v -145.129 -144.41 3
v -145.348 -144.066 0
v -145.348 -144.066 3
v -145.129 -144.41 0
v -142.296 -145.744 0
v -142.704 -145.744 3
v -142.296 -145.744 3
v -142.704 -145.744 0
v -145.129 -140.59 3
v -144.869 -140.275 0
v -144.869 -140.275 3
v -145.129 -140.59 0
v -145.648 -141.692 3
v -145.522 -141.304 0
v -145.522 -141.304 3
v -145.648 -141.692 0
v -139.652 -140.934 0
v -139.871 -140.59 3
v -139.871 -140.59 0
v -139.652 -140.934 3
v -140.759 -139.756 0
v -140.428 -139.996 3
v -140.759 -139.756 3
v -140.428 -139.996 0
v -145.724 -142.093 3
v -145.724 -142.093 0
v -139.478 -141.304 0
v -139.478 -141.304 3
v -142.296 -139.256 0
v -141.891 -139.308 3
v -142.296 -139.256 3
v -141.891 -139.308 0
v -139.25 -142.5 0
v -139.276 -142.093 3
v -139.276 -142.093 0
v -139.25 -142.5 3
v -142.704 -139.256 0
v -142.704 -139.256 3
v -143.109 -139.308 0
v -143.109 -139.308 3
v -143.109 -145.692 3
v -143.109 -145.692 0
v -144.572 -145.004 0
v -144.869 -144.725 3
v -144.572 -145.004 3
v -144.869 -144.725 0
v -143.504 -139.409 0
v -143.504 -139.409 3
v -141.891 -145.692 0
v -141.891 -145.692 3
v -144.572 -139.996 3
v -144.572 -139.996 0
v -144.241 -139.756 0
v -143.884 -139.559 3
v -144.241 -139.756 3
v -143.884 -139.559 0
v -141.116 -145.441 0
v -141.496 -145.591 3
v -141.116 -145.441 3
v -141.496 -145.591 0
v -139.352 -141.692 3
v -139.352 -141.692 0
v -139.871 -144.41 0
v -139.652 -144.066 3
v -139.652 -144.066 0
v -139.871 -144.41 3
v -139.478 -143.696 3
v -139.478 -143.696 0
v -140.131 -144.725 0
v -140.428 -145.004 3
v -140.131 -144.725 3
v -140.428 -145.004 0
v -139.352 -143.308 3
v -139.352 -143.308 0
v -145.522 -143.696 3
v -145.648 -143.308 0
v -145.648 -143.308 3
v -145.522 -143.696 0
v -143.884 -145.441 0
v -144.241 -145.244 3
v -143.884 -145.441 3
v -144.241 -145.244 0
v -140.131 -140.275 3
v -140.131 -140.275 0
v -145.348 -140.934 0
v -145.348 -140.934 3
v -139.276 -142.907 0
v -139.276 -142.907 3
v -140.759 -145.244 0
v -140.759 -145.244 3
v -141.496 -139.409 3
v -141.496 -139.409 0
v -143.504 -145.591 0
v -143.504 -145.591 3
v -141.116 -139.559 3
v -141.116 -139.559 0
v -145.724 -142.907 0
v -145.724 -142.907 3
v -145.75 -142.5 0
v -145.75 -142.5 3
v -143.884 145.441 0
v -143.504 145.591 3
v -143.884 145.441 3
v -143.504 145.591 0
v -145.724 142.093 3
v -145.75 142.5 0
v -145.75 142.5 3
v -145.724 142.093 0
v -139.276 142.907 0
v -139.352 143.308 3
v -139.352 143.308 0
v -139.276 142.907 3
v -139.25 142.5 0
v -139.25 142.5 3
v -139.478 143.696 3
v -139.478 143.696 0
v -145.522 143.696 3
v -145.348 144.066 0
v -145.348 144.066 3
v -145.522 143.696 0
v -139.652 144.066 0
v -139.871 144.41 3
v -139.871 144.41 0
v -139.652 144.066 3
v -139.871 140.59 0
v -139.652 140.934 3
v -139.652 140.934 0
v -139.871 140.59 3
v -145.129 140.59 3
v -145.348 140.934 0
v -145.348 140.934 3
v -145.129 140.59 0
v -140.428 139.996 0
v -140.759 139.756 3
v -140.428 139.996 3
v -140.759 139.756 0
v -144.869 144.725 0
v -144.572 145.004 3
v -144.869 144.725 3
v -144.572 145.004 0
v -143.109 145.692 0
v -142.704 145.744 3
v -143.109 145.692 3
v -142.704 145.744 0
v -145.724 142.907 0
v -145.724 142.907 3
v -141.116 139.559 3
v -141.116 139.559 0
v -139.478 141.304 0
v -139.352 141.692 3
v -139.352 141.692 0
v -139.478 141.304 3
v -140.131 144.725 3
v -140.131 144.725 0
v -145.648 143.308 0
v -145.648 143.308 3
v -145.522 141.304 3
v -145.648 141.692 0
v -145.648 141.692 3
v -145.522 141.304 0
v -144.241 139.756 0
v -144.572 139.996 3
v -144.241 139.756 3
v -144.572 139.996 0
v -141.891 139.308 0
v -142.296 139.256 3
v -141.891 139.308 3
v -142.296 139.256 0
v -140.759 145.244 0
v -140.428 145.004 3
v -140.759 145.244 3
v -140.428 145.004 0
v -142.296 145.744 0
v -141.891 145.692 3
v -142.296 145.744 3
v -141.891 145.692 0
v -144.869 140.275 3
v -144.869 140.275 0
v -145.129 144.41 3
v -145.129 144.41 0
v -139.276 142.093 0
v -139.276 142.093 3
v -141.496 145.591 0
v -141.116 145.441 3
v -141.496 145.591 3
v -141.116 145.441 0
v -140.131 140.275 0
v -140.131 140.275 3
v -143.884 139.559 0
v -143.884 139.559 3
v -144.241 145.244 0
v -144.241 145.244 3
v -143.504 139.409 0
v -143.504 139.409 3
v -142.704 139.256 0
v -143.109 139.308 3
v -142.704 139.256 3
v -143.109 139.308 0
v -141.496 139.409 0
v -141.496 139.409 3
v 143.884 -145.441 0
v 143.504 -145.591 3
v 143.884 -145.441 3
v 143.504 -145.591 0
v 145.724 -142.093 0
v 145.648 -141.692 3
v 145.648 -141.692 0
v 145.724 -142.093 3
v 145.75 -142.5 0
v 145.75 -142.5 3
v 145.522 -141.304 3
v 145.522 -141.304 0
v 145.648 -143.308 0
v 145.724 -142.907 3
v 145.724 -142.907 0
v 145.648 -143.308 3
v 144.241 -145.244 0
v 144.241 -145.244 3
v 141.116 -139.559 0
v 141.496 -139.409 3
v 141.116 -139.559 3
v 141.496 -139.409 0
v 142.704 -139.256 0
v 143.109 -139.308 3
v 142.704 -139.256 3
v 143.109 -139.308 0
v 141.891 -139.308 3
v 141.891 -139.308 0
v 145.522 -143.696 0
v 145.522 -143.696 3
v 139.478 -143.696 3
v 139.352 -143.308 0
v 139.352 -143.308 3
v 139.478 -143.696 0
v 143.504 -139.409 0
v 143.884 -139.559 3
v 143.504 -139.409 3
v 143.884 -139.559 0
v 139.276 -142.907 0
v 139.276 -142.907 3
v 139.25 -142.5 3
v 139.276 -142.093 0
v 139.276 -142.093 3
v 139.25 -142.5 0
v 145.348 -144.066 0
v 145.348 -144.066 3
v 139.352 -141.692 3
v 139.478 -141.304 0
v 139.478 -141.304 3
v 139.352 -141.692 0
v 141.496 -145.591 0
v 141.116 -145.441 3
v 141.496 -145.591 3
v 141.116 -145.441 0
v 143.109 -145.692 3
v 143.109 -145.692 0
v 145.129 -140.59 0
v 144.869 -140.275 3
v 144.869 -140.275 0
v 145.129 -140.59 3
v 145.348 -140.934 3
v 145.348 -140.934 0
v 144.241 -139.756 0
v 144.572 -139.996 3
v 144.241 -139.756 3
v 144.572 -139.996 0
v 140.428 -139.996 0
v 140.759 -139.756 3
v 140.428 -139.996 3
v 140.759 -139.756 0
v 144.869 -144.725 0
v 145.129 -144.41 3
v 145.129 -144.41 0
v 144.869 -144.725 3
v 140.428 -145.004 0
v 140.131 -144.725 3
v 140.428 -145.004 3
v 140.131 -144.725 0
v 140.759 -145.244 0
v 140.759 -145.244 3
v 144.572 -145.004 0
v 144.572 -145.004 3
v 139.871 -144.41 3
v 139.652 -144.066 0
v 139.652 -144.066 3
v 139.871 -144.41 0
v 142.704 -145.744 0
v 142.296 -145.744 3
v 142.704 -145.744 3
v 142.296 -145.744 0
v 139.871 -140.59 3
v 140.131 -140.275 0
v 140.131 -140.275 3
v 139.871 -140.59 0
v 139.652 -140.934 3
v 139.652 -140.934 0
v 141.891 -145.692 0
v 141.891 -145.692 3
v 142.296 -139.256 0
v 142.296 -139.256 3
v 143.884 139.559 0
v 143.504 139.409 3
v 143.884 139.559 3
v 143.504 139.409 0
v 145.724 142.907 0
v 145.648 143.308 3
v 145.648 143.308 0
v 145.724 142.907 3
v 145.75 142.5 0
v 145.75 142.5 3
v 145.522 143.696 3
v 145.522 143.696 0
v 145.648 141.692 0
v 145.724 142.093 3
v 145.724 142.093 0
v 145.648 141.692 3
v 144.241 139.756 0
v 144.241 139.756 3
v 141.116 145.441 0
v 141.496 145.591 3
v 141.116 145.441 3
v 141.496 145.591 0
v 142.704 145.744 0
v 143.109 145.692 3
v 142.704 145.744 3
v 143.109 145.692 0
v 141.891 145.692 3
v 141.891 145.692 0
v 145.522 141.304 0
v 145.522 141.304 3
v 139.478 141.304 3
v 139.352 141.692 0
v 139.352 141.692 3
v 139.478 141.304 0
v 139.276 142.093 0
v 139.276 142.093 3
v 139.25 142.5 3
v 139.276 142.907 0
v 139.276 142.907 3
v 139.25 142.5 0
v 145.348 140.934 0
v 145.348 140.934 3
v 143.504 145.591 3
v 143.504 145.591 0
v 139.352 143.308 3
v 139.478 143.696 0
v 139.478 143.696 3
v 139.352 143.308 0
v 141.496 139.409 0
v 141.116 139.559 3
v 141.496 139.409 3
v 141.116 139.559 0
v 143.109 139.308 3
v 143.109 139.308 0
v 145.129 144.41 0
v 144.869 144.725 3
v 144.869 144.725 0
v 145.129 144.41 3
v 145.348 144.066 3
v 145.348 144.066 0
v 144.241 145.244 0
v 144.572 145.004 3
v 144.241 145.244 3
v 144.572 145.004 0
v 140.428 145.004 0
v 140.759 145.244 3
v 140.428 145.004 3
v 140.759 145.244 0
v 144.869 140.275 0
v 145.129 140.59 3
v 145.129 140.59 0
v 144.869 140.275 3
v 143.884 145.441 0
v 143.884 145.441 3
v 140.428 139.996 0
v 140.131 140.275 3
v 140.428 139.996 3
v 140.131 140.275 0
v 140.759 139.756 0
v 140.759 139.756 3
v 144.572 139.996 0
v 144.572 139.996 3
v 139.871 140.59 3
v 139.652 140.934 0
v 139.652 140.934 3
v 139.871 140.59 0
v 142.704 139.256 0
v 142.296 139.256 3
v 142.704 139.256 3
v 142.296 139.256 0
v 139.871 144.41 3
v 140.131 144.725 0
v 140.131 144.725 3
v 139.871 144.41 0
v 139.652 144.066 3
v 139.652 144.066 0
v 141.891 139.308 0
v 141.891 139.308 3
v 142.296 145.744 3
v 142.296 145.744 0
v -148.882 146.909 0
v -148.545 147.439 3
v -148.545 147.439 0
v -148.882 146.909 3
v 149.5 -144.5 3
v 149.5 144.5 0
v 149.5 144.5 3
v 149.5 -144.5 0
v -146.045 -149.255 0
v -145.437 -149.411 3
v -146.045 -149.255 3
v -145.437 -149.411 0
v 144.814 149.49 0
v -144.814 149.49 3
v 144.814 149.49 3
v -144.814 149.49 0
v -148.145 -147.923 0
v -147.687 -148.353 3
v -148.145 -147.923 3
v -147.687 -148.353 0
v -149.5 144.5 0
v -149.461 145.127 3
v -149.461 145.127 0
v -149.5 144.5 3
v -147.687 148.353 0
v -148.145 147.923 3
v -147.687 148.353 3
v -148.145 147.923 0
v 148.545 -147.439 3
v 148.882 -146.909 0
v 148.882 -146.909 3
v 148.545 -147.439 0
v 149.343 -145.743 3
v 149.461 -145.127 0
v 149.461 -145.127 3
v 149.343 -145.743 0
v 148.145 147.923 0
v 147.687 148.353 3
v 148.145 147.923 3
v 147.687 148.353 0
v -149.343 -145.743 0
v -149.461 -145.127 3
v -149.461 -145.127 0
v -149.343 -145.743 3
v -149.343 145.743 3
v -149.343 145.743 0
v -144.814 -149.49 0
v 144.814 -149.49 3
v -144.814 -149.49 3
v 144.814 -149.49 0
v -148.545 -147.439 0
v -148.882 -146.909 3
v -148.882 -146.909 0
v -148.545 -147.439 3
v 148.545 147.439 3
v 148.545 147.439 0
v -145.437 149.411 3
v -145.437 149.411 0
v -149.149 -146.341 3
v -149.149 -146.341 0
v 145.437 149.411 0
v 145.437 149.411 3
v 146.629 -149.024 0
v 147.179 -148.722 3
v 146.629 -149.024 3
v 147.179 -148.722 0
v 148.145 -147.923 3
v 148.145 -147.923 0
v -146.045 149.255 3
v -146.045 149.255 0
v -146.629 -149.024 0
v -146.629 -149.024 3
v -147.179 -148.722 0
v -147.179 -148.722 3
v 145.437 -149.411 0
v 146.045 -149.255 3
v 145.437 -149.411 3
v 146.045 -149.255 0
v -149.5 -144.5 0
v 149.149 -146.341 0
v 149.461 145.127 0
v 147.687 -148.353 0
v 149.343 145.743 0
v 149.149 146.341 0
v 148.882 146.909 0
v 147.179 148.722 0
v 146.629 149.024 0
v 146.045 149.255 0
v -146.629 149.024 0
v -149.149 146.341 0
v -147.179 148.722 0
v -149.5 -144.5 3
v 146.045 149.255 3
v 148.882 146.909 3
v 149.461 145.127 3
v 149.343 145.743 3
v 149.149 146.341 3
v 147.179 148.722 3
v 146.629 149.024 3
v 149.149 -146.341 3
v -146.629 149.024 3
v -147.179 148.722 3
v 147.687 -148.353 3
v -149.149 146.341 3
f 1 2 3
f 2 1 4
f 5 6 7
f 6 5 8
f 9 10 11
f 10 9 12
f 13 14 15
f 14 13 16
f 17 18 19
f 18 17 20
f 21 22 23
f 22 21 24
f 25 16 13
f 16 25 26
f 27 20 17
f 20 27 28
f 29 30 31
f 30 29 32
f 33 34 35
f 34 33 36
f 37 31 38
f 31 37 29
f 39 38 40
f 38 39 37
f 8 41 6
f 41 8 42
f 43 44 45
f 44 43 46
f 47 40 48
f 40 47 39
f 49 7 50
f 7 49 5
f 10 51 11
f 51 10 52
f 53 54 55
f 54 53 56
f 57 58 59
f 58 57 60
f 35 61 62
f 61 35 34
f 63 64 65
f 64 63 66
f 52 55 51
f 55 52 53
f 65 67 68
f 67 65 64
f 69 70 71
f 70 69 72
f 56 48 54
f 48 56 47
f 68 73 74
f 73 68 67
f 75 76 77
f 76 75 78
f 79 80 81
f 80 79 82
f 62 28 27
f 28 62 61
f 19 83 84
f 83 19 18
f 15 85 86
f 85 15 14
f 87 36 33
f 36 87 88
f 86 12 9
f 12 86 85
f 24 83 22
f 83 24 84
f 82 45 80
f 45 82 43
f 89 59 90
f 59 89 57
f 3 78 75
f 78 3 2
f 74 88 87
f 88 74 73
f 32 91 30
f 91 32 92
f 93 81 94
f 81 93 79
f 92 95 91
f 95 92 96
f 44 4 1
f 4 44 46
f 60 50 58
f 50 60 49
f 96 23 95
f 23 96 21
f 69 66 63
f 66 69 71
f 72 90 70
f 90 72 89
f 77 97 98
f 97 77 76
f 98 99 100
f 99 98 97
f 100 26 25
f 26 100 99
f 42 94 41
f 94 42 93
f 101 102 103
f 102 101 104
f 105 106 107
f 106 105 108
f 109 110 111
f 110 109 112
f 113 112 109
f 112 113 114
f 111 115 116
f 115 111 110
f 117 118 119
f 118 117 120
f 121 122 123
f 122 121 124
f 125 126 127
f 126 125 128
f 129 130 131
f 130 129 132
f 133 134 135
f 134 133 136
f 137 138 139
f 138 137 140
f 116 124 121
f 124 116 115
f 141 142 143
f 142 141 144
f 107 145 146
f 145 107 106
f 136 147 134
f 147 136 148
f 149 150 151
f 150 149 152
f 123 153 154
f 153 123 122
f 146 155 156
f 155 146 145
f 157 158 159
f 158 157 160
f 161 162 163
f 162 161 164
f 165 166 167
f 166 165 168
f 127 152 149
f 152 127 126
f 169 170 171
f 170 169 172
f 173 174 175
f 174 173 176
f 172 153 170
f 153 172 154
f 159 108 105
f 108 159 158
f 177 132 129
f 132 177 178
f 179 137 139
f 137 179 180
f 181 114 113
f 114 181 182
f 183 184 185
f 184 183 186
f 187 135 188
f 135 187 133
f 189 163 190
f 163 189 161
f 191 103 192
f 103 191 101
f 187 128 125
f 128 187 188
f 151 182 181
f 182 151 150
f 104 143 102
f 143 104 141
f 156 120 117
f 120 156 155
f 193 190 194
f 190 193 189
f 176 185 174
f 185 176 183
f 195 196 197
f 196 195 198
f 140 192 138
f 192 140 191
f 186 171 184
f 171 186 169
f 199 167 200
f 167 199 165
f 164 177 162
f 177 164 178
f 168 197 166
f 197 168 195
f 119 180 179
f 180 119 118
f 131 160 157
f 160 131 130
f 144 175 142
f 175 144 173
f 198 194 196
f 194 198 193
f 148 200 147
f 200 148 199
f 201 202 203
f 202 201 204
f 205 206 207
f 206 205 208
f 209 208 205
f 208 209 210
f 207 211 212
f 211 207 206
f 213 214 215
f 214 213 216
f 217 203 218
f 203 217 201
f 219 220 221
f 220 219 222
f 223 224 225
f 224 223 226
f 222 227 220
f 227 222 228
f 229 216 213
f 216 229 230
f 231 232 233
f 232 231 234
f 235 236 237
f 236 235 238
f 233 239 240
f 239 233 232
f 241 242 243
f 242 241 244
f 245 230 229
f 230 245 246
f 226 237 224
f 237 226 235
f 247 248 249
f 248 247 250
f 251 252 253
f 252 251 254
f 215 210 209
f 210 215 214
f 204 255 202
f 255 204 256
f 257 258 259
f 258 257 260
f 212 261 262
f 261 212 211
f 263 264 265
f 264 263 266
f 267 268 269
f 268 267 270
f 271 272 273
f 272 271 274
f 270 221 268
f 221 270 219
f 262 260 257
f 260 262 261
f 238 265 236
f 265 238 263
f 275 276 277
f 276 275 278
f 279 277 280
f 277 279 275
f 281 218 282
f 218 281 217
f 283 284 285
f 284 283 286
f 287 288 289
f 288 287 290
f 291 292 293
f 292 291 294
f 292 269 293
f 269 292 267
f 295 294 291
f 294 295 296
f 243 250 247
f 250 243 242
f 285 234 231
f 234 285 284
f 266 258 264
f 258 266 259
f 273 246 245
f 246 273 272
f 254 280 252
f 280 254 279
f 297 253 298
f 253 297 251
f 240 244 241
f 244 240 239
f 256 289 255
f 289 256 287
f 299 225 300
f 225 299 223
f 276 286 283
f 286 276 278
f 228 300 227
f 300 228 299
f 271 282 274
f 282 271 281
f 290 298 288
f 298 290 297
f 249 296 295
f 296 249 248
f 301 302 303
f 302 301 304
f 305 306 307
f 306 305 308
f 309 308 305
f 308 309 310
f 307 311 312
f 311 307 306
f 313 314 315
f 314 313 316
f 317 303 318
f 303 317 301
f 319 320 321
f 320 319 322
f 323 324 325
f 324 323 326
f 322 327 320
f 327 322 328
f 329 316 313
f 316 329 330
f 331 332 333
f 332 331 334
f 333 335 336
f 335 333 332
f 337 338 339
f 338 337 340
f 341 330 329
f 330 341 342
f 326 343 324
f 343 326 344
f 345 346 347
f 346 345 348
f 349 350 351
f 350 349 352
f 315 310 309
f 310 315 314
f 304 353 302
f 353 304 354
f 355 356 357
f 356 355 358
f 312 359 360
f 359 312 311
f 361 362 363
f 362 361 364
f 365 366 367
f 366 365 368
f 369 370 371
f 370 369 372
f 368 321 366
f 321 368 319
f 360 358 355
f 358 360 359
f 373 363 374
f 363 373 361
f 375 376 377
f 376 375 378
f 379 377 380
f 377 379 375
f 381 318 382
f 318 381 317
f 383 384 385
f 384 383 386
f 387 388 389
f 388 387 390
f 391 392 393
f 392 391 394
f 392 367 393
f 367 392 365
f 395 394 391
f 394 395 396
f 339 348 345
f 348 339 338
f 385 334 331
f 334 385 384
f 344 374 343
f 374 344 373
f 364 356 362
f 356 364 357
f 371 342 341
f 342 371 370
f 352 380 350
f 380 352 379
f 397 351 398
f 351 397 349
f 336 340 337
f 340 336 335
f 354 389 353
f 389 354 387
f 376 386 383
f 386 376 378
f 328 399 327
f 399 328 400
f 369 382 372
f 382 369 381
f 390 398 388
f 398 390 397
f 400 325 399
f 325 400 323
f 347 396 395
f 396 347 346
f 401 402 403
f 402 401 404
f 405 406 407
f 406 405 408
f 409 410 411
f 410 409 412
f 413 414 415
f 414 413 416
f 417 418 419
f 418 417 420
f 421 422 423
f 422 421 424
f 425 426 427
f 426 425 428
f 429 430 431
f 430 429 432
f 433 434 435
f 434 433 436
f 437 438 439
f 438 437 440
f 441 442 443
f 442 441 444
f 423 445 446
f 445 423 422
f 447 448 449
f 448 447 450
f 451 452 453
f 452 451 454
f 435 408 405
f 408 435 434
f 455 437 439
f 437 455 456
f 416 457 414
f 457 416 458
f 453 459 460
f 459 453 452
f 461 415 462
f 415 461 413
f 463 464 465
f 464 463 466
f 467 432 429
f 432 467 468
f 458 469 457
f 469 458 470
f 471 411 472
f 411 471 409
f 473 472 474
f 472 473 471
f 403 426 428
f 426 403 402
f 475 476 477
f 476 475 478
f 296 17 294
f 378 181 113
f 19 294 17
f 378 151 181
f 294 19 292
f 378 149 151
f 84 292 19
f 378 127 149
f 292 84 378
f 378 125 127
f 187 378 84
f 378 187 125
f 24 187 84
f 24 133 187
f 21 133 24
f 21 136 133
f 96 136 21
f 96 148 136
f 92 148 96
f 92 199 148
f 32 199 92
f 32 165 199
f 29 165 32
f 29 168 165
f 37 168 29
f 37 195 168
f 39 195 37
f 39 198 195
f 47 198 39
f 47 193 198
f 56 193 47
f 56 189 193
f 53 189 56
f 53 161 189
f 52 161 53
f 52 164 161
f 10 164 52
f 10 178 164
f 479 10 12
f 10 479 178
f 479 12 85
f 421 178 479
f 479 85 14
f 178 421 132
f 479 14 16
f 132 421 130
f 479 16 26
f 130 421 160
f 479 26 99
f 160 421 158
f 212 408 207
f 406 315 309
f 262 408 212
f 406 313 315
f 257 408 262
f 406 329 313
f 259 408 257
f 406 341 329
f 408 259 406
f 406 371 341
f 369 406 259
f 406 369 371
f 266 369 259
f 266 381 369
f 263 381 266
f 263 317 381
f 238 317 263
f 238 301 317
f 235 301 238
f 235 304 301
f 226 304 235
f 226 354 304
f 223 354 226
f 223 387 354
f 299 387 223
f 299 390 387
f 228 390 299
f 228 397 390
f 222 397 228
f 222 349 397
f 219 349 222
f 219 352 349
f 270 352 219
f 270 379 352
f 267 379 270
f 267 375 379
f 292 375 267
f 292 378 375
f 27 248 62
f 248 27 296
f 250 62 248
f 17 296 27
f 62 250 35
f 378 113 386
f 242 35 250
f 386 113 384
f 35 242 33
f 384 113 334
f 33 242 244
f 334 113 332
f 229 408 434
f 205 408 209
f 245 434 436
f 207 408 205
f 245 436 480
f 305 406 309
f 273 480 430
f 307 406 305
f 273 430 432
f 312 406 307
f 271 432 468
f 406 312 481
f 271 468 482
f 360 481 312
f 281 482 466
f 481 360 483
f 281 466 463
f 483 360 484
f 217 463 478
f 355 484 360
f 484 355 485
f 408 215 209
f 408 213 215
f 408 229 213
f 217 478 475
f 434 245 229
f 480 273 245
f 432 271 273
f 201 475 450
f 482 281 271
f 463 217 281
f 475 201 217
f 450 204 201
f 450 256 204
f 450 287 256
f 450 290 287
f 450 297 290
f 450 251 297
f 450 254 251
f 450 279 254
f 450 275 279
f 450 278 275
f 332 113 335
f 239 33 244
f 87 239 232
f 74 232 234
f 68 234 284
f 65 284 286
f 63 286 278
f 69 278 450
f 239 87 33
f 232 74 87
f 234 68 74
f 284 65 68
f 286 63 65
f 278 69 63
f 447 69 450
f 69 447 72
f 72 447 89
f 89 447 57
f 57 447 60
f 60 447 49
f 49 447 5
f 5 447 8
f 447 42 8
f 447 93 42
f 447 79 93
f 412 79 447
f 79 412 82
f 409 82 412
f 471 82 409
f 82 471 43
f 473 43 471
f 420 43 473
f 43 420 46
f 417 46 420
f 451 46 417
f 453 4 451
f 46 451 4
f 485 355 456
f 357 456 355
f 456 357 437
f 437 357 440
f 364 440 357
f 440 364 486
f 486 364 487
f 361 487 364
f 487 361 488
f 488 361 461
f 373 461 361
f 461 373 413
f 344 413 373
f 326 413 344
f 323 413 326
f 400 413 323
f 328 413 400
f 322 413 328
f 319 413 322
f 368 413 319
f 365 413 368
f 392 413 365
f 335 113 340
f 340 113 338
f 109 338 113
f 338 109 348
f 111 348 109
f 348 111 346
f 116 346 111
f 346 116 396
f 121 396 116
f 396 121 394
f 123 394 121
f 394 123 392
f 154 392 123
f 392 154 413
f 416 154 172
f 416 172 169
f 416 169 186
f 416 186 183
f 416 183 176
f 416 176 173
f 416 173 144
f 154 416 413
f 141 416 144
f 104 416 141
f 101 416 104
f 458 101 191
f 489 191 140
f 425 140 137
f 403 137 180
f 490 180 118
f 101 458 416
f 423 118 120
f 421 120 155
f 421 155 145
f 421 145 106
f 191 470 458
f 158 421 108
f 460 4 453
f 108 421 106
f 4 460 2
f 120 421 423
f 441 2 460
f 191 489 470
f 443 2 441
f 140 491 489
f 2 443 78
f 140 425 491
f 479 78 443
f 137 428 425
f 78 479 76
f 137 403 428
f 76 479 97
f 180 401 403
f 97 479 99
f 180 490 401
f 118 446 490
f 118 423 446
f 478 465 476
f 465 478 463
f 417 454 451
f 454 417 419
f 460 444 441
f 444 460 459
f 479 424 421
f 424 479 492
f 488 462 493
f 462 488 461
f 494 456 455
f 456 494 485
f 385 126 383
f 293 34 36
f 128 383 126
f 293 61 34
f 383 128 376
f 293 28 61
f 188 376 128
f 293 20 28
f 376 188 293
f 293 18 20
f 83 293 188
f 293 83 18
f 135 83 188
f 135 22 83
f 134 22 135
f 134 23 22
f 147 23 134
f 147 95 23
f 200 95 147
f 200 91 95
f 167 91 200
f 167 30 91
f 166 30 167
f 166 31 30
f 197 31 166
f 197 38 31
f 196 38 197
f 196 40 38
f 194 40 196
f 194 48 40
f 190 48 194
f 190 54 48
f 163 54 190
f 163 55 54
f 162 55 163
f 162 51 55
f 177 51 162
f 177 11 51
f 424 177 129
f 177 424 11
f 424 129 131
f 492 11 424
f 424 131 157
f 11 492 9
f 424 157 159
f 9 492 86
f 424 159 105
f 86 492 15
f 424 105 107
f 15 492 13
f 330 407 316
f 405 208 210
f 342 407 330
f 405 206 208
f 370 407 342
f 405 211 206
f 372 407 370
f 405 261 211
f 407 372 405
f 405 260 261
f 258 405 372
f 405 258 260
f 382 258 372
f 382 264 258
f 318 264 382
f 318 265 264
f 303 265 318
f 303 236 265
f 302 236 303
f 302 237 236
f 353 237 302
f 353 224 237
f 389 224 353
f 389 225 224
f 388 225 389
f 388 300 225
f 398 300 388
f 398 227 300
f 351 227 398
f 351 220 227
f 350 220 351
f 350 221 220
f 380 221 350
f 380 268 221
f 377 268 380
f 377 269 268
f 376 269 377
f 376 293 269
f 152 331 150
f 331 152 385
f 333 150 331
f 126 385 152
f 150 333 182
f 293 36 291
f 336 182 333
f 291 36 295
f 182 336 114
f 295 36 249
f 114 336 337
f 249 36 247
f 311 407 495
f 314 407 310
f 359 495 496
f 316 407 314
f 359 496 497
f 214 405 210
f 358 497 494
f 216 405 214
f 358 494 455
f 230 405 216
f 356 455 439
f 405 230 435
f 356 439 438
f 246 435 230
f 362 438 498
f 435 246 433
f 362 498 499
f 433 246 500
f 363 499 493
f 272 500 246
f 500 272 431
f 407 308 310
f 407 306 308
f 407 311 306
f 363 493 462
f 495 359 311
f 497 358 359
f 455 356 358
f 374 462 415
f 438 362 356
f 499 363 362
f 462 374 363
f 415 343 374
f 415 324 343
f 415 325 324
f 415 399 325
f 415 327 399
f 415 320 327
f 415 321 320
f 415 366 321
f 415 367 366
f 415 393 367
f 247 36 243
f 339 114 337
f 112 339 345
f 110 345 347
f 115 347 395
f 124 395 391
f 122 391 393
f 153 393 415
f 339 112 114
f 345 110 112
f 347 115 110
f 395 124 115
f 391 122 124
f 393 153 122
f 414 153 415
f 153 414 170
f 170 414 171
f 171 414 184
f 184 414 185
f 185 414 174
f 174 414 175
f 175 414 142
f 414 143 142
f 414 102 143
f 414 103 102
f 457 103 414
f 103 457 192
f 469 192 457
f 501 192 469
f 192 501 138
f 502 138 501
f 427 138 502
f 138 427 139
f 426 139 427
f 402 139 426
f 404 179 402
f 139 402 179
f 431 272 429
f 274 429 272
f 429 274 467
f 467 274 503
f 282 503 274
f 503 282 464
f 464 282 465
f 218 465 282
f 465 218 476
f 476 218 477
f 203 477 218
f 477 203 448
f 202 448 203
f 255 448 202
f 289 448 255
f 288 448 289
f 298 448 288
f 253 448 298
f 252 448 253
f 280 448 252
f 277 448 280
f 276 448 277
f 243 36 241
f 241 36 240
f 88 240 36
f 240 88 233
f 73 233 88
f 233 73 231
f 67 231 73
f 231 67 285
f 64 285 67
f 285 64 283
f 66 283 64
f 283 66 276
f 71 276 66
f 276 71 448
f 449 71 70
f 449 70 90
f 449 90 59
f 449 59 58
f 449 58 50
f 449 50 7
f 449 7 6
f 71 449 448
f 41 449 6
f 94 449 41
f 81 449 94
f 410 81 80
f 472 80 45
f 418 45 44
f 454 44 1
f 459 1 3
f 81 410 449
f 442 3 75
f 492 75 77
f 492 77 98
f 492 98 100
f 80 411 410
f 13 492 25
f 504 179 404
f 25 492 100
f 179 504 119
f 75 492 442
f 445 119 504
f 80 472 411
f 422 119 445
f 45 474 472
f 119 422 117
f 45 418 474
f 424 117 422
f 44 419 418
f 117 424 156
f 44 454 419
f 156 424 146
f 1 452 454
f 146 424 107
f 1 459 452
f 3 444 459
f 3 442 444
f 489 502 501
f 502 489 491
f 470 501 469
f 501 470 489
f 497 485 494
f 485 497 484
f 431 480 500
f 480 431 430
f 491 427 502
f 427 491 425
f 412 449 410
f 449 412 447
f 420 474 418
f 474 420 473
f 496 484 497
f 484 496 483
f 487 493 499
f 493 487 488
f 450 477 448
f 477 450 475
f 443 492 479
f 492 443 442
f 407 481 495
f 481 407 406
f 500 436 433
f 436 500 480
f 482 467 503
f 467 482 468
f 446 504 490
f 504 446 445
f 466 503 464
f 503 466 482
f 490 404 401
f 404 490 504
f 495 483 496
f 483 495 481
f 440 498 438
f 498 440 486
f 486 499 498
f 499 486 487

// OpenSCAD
$fn = 50;


difference() {
	union() {
		hull() {
			translate(v = [-144.5000000000, 144.5000000000, 0]) {
				cylinder(h = 3, r = 5);
			}
			translate(v = [144.5000000000, 144.5000000000, 0]) {
				cylinder(h = 3, r = 5);
			}
			translate(v = [-144.5000000000, -144.5000000000, 0]) {
				cylinder(h = 3, r = 5);
			}
			translate(v = [144.5000000000, -144.5000000000, 0]) {
				cylinder(h = 3, r = 5);
			}
		}
	}
	union() {
		translate(v = [-142.5000000000, -142.5000000000, -100.0000000000]) {
			cylinder(h = 200, r = 3.2500000000);
		}
		translate(v = [-142.5000000000, 142.5000000000, -100.0000000000]) {
			cylinder(h = 200, r = 3.2500000000);
		}
		translate(v = [142.5000000000, -142.5000000000, -100.0000000000]) {
			cylinder(h = 200, r = 3.2500000000);
		}
		translate(v = [142.5000000000, 142.5000000000, -100.0000000000]) {
			cylinder(h = 200, r = 3.2500000000);
		}
	}
}
